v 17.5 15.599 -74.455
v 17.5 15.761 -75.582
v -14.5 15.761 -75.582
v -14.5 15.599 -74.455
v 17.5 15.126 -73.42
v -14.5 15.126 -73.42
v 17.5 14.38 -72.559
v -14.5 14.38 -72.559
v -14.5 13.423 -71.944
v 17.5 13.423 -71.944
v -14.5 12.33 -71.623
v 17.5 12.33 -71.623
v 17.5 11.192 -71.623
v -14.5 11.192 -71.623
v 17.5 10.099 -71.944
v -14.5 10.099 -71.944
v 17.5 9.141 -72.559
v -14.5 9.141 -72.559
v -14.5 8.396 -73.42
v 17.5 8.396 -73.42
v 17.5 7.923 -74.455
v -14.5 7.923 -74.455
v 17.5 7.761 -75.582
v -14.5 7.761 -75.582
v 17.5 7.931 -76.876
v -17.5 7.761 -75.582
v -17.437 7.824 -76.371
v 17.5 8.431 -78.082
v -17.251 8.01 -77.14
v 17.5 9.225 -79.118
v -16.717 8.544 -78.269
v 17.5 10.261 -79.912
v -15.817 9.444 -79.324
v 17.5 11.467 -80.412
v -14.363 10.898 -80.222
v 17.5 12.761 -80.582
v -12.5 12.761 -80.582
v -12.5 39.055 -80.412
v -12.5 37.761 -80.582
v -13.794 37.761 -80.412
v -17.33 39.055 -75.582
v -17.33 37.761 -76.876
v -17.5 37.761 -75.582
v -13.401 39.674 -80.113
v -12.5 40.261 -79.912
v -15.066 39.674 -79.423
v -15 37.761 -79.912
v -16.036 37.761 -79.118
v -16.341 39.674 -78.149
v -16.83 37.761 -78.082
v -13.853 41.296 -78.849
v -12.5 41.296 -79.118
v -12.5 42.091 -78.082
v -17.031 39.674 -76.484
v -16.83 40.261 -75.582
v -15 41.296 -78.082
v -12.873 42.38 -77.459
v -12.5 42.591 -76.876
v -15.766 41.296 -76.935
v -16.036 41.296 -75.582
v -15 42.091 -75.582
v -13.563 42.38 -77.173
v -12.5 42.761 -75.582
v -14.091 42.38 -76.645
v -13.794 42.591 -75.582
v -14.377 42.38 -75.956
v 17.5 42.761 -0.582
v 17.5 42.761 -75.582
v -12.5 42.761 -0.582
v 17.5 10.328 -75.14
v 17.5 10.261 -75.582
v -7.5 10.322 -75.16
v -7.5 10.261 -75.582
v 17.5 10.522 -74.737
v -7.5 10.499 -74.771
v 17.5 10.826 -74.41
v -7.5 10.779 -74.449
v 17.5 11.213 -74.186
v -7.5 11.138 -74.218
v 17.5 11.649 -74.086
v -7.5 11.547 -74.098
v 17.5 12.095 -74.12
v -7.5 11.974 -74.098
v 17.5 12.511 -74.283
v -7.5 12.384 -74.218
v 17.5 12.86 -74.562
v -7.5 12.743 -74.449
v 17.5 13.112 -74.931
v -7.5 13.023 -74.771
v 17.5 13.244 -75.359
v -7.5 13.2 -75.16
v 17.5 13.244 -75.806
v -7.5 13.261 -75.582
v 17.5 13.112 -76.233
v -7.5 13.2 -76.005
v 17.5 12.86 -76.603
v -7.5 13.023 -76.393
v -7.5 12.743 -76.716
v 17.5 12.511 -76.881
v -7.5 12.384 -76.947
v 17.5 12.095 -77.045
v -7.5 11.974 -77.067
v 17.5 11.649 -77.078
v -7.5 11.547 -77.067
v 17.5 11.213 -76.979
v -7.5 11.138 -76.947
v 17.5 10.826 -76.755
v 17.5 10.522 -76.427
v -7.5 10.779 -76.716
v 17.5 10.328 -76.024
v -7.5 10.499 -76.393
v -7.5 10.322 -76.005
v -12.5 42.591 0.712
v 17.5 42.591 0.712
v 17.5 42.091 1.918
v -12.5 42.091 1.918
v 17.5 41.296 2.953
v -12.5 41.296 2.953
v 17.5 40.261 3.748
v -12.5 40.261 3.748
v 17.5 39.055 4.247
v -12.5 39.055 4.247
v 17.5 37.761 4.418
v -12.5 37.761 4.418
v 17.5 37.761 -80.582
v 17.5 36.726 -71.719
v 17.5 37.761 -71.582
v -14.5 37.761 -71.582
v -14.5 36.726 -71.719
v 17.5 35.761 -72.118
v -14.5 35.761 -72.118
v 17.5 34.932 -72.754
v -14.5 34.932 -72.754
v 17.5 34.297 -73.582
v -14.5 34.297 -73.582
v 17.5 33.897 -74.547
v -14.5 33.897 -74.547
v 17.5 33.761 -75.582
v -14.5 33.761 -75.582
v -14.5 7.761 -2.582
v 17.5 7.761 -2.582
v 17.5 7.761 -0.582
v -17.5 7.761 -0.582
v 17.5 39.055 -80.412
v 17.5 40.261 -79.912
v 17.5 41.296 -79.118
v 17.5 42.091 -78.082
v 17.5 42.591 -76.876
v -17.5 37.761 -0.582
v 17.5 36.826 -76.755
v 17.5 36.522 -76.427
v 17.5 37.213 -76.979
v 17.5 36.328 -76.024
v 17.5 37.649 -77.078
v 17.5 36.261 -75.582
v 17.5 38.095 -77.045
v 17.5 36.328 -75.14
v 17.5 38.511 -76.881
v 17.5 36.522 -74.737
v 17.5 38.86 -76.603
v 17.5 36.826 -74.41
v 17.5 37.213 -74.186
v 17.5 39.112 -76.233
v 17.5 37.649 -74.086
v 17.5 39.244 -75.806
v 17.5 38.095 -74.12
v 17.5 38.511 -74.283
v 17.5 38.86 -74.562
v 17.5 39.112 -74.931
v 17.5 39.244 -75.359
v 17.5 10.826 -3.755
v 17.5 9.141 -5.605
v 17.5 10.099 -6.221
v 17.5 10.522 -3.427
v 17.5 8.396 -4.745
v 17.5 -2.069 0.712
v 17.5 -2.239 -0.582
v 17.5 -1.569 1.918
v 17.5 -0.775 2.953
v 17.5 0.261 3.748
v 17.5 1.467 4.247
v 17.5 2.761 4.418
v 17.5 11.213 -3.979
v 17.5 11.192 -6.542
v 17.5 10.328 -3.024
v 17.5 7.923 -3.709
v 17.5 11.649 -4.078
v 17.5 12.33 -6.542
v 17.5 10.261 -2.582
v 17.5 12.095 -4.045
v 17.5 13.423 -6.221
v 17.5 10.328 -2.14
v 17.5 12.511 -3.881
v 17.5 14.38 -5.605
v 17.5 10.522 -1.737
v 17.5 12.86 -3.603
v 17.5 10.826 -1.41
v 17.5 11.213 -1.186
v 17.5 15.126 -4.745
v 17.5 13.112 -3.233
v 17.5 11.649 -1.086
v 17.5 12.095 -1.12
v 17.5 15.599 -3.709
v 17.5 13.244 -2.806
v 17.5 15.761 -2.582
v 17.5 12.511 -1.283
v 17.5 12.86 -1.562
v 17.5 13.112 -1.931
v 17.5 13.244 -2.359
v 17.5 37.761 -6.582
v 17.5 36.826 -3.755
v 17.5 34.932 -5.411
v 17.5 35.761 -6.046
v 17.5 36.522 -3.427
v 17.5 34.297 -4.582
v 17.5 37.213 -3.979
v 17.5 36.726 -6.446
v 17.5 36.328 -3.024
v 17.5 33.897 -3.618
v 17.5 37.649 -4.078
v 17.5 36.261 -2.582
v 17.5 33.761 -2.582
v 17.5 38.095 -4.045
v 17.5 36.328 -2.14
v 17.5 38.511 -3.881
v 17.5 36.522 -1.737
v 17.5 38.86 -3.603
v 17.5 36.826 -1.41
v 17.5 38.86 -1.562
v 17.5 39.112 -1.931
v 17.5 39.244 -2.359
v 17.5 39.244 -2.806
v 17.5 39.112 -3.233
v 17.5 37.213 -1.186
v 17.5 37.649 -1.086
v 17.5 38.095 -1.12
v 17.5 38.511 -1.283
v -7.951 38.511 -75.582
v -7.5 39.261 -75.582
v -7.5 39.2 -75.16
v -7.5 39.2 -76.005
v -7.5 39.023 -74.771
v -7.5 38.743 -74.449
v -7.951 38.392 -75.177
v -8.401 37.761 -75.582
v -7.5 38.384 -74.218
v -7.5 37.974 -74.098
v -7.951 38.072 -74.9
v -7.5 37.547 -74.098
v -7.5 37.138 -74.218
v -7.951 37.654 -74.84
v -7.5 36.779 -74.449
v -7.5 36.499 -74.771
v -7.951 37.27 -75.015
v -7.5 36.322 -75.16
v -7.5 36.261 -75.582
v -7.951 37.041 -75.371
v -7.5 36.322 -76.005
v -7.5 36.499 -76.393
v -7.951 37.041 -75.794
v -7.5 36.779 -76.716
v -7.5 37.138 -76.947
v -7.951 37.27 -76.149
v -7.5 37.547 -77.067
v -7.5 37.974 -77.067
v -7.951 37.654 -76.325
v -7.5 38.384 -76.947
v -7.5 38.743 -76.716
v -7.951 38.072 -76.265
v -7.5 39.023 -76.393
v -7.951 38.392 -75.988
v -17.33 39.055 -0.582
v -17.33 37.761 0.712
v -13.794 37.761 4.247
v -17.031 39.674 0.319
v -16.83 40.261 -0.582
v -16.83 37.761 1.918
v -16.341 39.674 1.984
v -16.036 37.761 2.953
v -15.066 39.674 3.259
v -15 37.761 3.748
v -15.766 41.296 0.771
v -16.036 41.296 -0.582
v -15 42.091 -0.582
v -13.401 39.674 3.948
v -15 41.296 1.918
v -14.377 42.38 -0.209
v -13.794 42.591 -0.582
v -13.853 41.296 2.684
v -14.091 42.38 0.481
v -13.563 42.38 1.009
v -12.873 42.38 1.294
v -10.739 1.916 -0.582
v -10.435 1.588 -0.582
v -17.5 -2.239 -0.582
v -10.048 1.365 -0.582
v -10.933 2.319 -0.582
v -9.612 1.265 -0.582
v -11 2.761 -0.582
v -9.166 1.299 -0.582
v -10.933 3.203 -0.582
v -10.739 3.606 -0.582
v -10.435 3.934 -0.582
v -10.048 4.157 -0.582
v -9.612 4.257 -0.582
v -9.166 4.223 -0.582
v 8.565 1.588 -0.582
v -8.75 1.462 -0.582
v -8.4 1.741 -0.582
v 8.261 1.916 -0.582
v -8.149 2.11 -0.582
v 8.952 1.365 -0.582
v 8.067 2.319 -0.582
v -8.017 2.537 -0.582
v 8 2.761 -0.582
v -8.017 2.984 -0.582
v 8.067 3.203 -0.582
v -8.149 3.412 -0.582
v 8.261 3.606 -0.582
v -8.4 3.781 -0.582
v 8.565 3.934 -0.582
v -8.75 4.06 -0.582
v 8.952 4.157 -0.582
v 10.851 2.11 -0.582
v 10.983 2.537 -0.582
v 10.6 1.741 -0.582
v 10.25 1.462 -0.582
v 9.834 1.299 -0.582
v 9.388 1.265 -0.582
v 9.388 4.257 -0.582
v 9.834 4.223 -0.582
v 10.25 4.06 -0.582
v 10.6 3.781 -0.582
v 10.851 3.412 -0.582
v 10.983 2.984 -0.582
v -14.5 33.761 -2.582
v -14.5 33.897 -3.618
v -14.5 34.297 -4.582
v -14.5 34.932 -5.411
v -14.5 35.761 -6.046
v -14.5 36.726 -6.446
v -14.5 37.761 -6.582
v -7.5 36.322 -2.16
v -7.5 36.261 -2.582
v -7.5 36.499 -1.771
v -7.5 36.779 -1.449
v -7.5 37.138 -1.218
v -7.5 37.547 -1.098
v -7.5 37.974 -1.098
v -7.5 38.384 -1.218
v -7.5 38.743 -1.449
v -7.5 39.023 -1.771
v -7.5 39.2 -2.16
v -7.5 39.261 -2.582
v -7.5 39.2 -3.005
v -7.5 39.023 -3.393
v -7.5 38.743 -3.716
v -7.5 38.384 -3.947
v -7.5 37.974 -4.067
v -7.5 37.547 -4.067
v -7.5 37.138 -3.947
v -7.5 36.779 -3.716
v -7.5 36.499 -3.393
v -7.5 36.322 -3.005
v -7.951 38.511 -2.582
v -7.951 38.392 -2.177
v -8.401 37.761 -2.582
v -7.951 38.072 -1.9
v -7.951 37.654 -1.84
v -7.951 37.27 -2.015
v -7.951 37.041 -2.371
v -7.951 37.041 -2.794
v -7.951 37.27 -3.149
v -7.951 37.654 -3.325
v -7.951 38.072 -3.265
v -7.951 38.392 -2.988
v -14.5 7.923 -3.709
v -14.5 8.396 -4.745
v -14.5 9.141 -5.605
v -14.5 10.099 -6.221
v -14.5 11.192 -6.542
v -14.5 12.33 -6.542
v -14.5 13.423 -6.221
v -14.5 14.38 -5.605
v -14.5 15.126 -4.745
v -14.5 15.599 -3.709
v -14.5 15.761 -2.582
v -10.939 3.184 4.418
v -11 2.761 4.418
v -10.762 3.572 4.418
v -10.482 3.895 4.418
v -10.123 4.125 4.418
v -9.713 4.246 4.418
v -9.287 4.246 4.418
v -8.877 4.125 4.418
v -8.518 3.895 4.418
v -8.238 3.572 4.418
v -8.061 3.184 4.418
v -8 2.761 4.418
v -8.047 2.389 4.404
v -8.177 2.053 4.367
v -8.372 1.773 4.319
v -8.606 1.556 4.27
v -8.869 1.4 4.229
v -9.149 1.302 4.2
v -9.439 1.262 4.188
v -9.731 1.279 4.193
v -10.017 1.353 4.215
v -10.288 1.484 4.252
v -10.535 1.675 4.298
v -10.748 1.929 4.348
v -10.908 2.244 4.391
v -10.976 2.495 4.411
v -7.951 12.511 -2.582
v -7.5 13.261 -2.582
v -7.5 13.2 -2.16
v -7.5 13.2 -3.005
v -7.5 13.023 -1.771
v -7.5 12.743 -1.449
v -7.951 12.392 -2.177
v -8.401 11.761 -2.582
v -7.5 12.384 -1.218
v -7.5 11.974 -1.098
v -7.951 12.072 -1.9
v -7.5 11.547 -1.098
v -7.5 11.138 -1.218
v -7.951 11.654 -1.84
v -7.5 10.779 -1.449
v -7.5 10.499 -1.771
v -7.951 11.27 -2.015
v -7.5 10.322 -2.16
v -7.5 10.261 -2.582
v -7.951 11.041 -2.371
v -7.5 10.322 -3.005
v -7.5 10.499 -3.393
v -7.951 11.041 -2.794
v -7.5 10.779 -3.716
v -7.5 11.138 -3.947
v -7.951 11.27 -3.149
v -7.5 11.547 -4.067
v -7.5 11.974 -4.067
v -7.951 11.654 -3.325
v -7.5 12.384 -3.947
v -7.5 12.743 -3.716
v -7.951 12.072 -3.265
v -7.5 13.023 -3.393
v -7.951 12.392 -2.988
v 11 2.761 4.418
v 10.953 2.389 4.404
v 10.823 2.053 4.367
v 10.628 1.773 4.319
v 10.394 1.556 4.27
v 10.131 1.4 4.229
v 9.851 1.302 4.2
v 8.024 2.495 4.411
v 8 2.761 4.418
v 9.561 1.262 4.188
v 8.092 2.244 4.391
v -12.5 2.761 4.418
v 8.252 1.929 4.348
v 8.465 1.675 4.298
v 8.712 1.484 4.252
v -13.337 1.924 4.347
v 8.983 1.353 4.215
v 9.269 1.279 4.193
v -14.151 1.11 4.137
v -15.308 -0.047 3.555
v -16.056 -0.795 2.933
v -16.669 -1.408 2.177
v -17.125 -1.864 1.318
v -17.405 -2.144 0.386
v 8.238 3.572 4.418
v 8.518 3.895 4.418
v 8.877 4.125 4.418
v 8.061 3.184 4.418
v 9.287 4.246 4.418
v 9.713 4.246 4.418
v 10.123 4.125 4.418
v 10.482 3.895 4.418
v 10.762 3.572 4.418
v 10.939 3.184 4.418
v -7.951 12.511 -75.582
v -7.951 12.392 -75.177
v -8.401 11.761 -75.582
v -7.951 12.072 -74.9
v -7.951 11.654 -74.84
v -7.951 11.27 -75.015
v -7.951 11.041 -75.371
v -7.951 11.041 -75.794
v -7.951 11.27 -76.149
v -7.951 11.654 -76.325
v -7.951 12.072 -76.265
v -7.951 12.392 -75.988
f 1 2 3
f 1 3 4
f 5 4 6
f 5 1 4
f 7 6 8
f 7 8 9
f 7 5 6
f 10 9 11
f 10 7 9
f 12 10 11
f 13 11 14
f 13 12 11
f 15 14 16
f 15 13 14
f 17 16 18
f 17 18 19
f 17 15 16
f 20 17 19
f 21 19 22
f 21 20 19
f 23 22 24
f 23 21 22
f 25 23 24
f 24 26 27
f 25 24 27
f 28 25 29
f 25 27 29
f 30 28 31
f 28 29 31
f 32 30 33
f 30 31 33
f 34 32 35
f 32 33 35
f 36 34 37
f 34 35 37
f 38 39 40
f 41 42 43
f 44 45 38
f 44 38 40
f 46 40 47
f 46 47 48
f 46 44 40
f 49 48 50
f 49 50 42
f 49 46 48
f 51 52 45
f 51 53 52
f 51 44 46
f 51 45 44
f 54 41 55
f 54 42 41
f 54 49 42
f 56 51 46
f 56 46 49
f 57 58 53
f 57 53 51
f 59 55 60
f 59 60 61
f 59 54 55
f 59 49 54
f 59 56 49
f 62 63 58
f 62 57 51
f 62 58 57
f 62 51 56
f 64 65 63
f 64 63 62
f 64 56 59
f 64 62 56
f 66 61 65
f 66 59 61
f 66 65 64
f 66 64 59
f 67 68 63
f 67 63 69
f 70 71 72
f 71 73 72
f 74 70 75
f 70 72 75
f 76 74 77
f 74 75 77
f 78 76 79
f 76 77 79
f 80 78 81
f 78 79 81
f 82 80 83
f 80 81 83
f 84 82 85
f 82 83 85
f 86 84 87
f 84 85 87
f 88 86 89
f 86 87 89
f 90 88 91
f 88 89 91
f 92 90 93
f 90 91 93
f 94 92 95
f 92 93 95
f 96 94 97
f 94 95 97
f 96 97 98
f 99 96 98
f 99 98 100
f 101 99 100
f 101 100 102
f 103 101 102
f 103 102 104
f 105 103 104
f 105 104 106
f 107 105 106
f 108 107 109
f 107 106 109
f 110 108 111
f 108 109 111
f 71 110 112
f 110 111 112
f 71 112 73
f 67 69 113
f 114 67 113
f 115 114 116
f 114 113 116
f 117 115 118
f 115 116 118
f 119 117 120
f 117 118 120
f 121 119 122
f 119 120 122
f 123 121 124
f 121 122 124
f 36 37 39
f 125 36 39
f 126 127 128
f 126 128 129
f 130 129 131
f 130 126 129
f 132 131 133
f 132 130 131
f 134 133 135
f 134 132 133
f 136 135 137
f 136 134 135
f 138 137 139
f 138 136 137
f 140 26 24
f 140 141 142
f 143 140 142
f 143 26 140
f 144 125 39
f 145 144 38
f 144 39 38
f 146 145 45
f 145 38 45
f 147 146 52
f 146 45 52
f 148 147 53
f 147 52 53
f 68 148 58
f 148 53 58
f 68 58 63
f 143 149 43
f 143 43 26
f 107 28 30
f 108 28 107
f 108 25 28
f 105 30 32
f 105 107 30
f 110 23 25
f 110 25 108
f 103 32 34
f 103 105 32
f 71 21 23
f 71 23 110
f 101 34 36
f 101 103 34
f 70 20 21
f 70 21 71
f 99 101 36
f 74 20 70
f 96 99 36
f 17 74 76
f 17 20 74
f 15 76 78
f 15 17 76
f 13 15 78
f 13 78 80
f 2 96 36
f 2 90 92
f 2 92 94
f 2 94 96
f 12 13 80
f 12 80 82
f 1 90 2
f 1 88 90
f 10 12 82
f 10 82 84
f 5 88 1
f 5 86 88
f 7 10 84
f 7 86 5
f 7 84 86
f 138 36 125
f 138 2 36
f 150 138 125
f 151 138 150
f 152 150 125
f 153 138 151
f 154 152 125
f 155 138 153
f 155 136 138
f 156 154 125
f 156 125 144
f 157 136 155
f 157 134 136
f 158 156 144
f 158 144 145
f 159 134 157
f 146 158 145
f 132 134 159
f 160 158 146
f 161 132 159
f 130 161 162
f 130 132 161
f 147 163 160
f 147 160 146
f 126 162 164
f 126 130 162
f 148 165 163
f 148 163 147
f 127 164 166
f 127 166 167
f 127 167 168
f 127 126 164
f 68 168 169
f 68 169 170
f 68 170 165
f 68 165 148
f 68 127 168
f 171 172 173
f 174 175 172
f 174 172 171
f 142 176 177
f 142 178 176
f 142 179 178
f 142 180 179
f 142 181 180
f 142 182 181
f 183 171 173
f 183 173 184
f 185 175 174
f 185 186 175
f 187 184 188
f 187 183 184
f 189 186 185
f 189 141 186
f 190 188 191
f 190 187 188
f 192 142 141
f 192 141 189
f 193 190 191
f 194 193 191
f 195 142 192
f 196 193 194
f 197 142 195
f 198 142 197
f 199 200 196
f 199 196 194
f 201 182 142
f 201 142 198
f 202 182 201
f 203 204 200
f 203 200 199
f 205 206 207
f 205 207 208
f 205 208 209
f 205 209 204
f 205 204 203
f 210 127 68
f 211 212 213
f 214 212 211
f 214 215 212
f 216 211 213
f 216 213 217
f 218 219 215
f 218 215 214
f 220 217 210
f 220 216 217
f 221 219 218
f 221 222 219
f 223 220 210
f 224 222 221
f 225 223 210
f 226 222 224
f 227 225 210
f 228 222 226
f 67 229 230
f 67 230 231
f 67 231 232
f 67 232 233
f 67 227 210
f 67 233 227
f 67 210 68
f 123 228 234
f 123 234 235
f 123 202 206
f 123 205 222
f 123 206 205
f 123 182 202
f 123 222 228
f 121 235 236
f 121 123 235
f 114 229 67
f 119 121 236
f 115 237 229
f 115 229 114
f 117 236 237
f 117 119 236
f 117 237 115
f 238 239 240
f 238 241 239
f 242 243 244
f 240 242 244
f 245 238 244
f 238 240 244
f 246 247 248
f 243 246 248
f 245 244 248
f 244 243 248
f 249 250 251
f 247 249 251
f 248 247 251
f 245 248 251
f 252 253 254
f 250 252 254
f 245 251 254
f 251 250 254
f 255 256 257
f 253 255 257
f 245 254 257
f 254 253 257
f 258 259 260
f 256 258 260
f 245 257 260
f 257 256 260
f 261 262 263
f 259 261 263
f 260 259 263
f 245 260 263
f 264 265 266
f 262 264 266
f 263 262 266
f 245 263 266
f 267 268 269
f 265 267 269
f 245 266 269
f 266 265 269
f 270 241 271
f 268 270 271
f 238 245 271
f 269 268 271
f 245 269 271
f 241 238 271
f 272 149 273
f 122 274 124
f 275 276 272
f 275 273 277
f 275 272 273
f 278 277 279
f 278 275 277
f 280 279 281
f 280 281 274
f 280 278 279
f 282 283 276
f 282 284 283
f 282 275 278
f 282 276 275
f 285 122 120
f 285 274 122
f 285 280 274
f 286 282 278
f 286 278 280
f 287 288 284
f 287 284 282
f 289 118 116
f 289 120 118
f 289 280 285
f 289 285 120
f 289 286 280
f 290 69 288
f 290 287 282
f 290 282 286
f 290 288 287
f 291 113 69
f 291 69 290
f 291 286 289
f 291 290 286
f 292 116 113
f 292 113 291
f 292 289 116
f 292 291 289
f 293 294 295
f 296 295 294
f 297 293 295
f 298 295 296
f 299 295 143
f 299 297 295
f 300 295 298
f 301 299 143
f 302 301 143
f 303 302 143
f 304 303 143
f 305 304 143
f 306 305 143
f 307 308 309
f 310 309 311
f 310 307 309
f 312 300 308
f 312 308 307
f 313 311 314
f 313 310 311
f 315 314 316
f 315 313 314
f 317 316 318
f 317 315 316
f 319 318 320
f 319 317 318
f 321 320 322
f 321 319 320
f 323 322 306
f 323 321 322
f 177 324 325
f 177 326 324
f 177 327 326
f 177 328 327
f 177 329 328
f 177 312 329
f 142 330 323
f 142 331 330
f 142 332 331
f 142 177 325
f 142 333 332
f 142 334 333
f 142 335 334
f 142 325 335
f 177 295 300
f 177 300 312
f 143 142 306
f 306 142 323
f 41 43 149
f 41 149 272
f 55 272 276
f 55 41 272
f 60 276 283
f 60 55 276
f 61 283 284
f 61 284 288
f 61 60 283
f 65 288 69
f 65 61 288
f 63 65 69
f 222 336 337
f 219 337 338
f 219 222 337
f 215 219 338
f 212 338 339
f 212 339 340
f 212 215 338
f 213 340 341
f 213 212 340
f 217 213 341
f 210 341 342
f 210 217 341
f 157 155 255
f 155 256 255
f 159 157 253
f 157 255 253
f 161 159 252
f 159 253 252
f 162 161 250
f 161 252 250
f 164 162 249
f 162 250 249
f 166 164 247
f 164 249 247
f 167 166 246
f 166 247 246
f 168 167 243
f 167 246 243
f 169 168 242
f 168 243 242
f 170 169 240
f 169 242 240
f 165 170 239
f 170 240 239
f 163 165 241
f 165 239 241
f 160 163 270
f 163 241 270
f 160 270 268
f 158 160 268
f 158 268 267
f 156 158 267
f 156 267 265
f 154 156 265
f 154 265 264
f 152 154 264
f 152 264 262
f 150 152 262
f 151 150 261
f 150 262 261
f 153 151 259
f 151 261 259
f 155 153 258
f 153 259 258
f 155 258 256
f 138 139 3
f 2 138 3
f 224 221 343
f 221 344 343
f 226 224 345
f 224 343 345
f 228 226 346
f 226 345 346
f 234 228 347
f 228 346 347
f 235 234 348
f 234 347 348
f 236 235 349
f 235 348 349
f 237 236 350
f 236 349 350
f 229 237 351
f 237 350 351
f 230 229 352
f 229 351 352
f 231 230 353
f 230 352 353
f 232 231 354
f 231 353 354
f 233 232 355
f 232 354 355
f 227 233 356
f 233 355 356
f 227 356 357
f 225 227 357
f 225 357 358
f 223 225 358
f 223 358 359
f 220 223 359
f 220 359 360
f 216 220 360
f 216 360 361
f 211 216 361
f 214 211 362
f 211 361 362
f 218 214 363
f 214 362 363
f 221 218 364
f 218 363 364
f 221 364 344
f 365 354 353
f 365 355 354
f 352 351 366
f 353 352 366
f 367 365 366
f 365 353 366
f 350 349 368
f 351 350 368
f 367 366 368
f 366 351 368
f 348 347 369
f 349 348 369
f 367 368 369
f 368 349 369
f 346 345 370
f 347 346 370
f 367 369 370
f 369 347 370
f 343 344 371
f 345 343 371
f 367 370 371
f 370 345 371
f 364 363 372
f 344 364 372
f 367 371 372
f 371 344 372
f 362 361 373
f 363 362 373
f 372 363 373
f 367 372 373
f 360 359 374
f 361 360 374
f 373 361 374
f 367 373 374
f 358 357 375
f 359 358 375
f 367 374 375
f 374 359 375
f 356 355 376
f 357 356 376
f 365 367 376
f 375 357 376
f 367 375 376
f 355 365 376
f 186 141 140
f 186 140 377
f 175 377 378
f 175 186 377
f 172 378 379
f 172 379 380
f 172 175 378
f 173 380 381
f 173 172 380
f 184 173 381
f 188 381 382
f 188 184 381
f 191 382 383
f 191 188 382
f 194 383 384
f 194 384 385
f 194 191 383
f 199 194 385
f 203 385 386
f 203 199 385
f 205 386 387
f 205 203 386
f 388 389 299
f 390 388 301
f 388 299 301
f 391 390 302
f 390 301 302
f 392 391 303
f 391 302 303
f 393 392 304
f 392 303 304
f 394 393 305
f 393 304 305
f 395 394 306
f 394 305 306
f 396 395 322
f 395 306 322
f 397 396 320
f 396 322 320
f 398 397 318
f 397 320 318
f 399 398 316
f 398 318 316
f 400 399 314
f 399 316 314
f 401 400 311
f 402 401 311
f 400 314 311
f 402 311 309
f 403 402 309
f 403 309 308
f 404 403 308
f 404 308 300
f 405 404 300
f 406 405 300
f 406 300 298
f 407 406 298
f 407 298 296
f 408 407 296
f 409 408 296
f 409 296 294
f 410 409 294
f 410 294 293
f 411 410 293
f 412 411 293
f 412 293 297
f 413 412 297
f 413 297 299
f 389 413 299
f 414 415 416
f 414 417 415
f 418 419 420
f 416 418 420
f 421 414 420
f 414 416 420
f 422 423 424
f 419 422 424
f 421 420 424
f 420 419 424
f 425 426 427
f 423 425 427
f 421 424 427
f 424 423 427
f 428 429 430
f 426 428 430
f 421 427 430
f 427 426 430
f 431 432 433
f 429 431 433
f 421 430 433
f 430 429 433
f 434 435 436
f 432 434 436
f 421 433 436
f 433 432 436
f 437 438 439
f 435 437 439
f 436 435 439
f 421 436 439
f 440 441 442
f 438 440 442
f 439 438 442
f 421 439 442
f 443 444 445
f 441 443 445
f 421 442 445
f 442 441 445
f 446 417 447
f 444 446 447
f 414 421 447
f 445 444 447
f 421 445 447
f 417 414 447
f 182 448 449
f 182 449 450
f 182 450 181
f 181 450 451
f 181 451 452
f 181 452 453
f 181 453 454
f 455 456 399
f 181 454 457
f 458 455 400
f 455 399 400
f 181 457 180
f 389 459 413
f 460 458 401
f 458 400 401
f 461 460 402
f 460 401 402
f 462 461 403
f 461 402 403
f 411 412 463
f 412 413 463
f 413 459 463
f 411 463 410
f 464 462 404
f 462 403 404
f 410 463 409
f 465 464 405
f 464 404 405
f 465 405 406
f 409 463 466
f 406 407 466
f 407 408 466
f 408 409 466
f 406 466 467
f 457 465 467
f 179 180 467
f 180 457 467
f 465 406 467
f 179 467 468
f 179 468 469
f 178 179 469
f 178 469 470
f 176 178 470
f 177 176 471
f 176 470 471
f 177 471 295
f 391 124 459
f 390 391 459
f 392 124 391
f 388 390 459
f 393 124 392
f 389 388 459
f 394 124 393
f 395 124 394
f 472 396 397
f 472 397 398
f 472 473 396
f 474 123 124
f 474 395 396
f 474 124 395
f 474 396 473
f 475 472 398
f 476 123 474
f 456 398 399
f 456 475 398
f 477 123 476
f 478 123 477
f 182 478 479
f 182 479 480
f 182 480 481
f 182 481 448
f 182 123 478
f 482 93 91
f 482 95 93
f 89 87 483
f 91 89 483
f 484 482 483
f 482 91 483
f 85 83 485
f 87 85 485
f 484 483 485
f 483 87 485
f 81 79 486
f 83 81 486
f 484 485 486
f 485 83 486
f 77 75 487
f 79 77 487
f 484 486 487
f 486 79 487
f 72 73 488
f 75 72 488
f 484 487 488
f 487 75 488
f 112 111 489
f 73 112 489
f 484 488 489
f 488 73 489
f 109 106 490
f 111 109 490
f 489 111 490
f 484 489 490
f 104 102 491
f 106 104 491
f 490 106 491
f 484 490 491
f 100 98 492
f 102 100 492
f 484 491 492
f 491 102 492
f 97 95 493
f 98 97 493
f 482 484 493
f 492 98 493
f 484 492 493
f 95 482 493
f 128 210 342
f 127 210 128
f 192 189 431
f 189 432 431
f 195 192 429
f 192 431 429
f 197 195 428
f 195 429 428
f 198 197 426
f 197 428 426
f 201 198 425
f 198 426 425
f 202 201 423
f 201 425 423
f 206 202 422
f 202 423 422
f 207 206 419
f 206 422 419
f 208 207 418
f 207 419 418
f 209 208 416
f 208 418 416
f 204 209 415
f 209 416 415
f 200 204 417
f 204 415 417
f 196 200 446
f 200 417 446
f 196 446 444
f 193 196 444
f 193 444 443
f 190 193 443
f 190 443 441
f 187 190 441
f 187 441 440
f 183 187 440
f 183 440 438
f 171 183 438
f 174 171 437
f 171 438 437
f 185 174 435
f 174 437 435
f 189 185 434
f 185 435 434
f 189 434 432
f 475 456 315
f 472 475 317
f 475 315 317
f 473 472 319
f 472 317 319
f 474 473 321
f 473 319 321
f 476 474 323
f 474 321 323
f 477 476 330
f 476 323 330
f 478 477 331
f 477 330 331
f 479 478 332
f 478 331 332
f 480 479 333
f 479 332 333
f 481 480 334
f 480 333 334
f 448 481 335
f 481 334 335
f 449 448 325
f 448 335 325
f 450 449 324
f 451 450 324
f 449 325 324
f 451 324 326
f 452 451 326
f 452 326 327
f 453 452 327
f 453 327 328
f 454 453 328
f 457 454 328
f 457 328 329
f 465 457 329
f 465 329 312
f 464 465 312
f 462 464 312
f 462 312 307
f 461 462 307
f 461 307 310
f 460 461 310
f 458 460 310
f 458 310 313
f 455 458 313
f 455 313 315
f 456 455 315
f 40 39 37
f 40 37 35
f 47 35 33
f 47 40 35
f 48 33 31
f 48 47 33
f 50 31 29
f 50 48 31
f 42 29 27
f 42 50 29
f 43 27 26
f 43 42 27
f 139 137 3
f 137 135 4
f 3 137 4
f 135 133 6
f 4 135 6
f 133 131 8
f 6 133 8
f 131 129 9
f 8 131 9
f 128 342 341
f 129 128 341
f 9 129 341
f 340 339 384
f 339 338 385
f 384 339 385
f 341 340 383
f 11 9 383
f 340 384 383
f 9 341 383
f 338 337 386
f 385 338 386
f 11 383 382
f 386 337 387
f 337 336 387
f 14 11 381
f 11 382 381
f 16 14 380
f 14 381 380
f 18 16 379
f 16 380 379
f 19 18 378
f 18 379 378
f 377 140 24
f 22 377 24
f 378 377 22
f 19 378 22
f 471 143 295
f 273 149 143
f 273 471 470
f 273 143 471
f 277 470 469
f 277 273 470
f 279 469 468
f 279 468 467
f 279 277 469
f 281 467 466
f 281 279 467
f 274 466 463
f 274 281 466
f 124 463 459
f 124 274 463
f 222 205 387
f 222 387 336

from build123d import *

# Parameters (mm, degrees)
F1_DEPTH     = 17.5
F3_DEPTH     = 3
F5_D         = 3
F5_DEPTH     = 25
F5_TIP       = 0.9012909285
F7_D         = 3
F7_DEPTH     = 25
F7_TIP       = 0.9012909285
F8_T1_DEPTH  = 60
F8_T3_DEPTH  = 42.5
F8_T5_DEPTH  = 75
F8_T7_DEPTH  = 42.5
F8_T9_DEPTH  = 52.5
F8_S13_W     = 5
F8_S13_H     = 5
F8_T14_DEPTH = 5
F8_S19_W     = 5
F8_S19_H     = 5
F8_T20_DEPTH = 5


# Not quite as in the source:
# - a fillet or chamfer that OpenCascade refuses, or shapes differently, is made with other operations: its cross-section is extruded or revolved along the edge and cut away or added


with BuildPart() as f1:
    # F0 (on Right) → F1 (new body, symmetric)
    with BuildSketch(Plane.YZ):
        Polygon((-2.2390836586, 4.4176964641), (-2.2390836586, -0.5823035359), (7.7609163414, -0.5823035359), (7.7609163414, -2.5823035359), (15.7609163414, -2.5823035359), (33.7609163414, -2.5823035359), (37.7609163414, -2.5823035359), (37.7609163414, -6.5823035359), (37.7609163414, -71.5823035359), (37.7609163414, -75.5823035359), (33.7609163414, -75.5823035359), (15.7609163414, -75.5823035359), (7.7609163414, -75.5823035359), (7.7609163414, -80.5823035359), (42.7609163414, -80.5823035359), (42.7609163414, 4.4176964641), align=None)
        with BuildLine():
            Line((15.7609163414, -2.5823035359), (7.7609163414, -2.5823035359))
            ThreePointArc((7.7609163414, -2.5823035359), (11.7609163414, -6.5823035359), (15.7609163414, -2.5823035359))
        make_face()
        with BuildLine():
            Line((37.7609163414, -2.5823035359), (33.7609163414, -2.5823035359))
            ThreePointArc((33.7609163414, -2.5823035359), (34.9324892166, -5.4107306607), (37.7609163414, -6.5823035359))
            Line((37.7609163414, -6.5823035359), (37.7609163414, -2.5823035359))
        make_face()
        with BuildLine():
            ThreePointArc((15.7609163414, -75.5823035359), (11.7609163414, -71.5823035359), (7.7609163414, -75.5823035359))
            Line((7.7609163414, -75.5823035359), (15.7609163414, -75.5823035359))
        make_face()
        with BuildLine():
            Line((37.7609163414, -75.5823035359), (37.7609163414, -71.5823035359))
            ThreePointArc((37.7609163414, -71.5823035359), (34.9324892166, -72.7538764112), (33.7609163414, -75.5823035359))
            Line((33.7609163414, -75.5823035359), (37.7609163414, -75.5823035359))
        make_face()
    extrude(amount=F1_DEPTH, both=True)

    # F2 (on face) → F3 (join)
    with BuildSketch(Plane(origin=(-17.5, 0, 0), x_dir=(0, -1, 0), z_dir=(-1, 0, 0))):
        with BuildLine():
            Line((-7.7609163414, -75.5823035359), (-7.7609163414, -2.5823035359))
            ThreePointArc((-7.7609163414, -2.5823035359), (-11.7609163414, -6.5823035359), (-15.7609163414, -2.5823035359))
            Line((-15.7609163414, -2.5823035359), (-33.7609163414, -2.5823035359))
            ThreePointArc((-33.7609163414, -2.5823035359), (-34.9324892166, -5.4107306607), (-37.7609163414, -6.5823035359))
            Line((-37.7609163414, -6.5823035359), (-37.7609163414, -71.5823035359))
            ThreePointArc((-37.7609163414, -71.5823035359), (-34.9324892166, -72.7538764112), (-33.7609163414, -75.5823035359))
            Line((-33.7609163414, -75.5823035359), (-15.7609163414, -75.5823035359))
            ThreePointArc((-15.7609163414, -75.5823035359), (-11.7609163414, -71.5823035359), (-7.7609163414, -75.5823035359))
        make_face()
    extrude(amount=-F3_DEPTH)

    # F5
    with Locations(Plane.YZ.offset(17.5)):
        with Locations((11.7609163414, -2.5823035359), (37.7609163414, -2.5823035359), (37.7609163414, -75.5823035359), (11.7609163414, -75.5823035359)):
            Hole(F5_D / 2, depth=F5_DEPTH)
            with Locations((0, 0, -(F5_DEPTH + F5_TIP / 2))):  # 118° drill point
                Cone(0, F5_D / 2, F5_TIP, mode=Mode.SUBTRACT)

    # F7
    with Locations(Plane.XY.offset(4.4176964641)):
        with Locations((-9.5, 2.7609163414), (9.5, 2.7609163414)):
            Hole(F7_D / 2, depth=F7_DEPTH)
            with Locations((0, 0, -(F7_DEPTH + F7_TIP / 2))):  # 118° drill point
                Cone(0, F7_D / 2, F7_TIP, mode=Mode.SUBTRACT)

    # F8: fillet of radius 5 on 7 edges, made by hand

    # F8_s2 → F8_t1 (cut)
    with BuildSketch(Plane.YZ.offset(-30)):
        with BuildLine():
            ThreePointArc((2.7609163414, 4.4176964641), (-0.7746175645, 2.95323037), (-2.2390836586, -0.5823035359))
            Line((-2.2390836586, -0.5823035359), (-2.2390836586, 4.4176964641))
            Line((-2.2390836586, 4.4176964641), (2.7609163414, 4.4176964641))
        make_face()
        with BuildLine():
            ThreePointArc((7.7609163414, -75.5823035359), (9.2253824355, -79.1178374419), (12.7609163414, -80.5823035359))
            Line((12.7609163414, -80.5823035359), (7.7609163414, -80.5823035359))
            Line((7.7609163414, -80.5823035359), (7.7609163414, -75.5823035359))
        make_face()
    extrude(amount=F8_T1_DEPTH, mode=Mode.SUBTRACT)

    # F8_s4 → F8_t3 (cut)
    with BuildSketch(Plane.YZ.offset(-12.5)):
        with BuildLine():
            ThreePointArc((42.7609163414, -0.5823035359), (41.2964502473, 2.95323037), (37.7609163414, 4.4176964641))
            Line((37.7609163414, 4.4176964641), (42.7609163414, 4.4176964641))
            Line((42.7609163414, 4.4176964641), (42.7609163414, -0.5823035359))
        make_face()
        with BuildLine():
            ThreePointArc((37.7609163414, -80.5823035359), (41.2964502473, -79.1178374419), (42.7609163414, -75.5823035359))
            Line((42.7609163414, -75.5823035359), (42.7609163414, -80.5823035359))
            Line((42.7609163414, -80.5823035359), (37.7609163414, -80.5823035359))
        make_face()
    extrude(amount=F8_T3_DEPTH, mode=Mode.SUBTRACT)

    # F8_s6 → F8_t5 (cut)
    with BuildSketch(Plane.XY.offset(-75.5823035359)):
        with BuildLine():
            ThreePointArc((-17.5, 37.7609163414), (-16.0355339059, 41.2964502473), (-12.5, 42.7609163414))
            Line((-12.5, 42.7609163414), (-17.5, 42.7609163414))
            Line((-17.5, 42.7609163414), (-17.5, 37.7609163414))
        make_face()
    extrude(amount=F8_T5_DEPTH, mode=Mode.SUBTRACT)

    # F8_s8 → F8_t7 (cut)
    with BuildSketch(Plane.XZ.offset(-37.7609163414)):
        with BuildLine():
            ThreePointArc((-12.5, -80.5823035359), (-16.0355339059, -79.1178374419), (-17.5, -75.5823035359))
            Line((-17.5, -75.5823035359), (-17.5, -80.5823035359))
            Line((-17.5, -80.5823035359), (-12.5, -80.5823035359))
        make_face()
    extrude(amount=F8_T7_DEPTH, mode=Mode.SUBTRACT)

    # F8_s10 → F8_t9 (cut)
    with BuildSketch(Plane.XZ.offset(-37.7609163414)):
        with BuildLine():
            ThreePointArc((-17.5, -0.5823035359), (-16.0355339059, 2.95323037), (-12.5, 4.4176964641))
            Line((-12.5, 4.4176964641), (-17.5, 4.4176964641))
            Line((-17.5, 4.4176964641), (-17.5, -0.5823035359))
        make_face()
    extrude(amount=F8_T9_DEPTH, mode=Mode.SUBTRACT)


with BuildPart() as f8_tool12:
    # F8_s13 → F8_t14 (new body)
    with BuildSketch(Plane.XZ.offset(-37.7609163414)):
        with Locations((-15, 1.9176964641)):
            Rectangle(F8_S13_W, F8_S13_H)
    extrude(amount=-F8_T14_DEPTH)

    # F8_s15 → F8_t16 (revolve, cut)
    with BuildSketch(Plane(origin=(-12.5, 37.7609163414, -0.5823035359), x_dir=(0.7071067812, 0, -0.7071067812), z_dir=(0.7071067812, 0, 0.7071067812))):
        with BuildLine():
            ThreePointArc((0, -5), (5, 0), (0, 5))
            Line((0, 5), (0, -5))
        make_face()
    revolve(axis=Axis((-12.5, 37.7609163414, -0.5823035359), (0, 1, 0)), mode=Mode.SUBTRACT)


with BuildPart() as f1_1:
    add(f1.part)

    # F8_t11: cut F8_tool12
    add(f8_tool12.part, mode=Mode.SUBTRACT)


with BuildPart() as f8_tool18:
    # F8_s19 → F8_t20 (new body)
    with BuildSketch(Plane.XZ.offset(-37.7609163414)):
        with Locations((-15, -78.0823035359)):
            Rectangle(F8_S19_W, F8_S19_H)
    extrude(amount=-F8_T20_DEPTH)

    # F8_s21 → F8_t22 (revolve, cut)
    with BuildSketch(Plane(origin=(-12.5, 37.7609163414, -75.5823035359), x_dir=(0.7071067812, 0, 0.7071067812), z_dir=(-0.7071067812, 0, 0.7071067812))):
        with BuildLine():
            ThreePointArc((0, -5), (5, 0), (0, 5))
            Line((0, 5), (0, -5))
        make_face()
    revolve(axis=Axis((-12.5, 37.7609163414, -75.5823035359), (0, 1, 0)), mode=Mode.SUBTRACT)


with BuildPart() as f1_2:
    add(f1_1.part)

    # F8_t17: cut F8_tool18
    add(f8_tool18.part, mode=Mode.SUBTRACT)


solid = f1_2.part
